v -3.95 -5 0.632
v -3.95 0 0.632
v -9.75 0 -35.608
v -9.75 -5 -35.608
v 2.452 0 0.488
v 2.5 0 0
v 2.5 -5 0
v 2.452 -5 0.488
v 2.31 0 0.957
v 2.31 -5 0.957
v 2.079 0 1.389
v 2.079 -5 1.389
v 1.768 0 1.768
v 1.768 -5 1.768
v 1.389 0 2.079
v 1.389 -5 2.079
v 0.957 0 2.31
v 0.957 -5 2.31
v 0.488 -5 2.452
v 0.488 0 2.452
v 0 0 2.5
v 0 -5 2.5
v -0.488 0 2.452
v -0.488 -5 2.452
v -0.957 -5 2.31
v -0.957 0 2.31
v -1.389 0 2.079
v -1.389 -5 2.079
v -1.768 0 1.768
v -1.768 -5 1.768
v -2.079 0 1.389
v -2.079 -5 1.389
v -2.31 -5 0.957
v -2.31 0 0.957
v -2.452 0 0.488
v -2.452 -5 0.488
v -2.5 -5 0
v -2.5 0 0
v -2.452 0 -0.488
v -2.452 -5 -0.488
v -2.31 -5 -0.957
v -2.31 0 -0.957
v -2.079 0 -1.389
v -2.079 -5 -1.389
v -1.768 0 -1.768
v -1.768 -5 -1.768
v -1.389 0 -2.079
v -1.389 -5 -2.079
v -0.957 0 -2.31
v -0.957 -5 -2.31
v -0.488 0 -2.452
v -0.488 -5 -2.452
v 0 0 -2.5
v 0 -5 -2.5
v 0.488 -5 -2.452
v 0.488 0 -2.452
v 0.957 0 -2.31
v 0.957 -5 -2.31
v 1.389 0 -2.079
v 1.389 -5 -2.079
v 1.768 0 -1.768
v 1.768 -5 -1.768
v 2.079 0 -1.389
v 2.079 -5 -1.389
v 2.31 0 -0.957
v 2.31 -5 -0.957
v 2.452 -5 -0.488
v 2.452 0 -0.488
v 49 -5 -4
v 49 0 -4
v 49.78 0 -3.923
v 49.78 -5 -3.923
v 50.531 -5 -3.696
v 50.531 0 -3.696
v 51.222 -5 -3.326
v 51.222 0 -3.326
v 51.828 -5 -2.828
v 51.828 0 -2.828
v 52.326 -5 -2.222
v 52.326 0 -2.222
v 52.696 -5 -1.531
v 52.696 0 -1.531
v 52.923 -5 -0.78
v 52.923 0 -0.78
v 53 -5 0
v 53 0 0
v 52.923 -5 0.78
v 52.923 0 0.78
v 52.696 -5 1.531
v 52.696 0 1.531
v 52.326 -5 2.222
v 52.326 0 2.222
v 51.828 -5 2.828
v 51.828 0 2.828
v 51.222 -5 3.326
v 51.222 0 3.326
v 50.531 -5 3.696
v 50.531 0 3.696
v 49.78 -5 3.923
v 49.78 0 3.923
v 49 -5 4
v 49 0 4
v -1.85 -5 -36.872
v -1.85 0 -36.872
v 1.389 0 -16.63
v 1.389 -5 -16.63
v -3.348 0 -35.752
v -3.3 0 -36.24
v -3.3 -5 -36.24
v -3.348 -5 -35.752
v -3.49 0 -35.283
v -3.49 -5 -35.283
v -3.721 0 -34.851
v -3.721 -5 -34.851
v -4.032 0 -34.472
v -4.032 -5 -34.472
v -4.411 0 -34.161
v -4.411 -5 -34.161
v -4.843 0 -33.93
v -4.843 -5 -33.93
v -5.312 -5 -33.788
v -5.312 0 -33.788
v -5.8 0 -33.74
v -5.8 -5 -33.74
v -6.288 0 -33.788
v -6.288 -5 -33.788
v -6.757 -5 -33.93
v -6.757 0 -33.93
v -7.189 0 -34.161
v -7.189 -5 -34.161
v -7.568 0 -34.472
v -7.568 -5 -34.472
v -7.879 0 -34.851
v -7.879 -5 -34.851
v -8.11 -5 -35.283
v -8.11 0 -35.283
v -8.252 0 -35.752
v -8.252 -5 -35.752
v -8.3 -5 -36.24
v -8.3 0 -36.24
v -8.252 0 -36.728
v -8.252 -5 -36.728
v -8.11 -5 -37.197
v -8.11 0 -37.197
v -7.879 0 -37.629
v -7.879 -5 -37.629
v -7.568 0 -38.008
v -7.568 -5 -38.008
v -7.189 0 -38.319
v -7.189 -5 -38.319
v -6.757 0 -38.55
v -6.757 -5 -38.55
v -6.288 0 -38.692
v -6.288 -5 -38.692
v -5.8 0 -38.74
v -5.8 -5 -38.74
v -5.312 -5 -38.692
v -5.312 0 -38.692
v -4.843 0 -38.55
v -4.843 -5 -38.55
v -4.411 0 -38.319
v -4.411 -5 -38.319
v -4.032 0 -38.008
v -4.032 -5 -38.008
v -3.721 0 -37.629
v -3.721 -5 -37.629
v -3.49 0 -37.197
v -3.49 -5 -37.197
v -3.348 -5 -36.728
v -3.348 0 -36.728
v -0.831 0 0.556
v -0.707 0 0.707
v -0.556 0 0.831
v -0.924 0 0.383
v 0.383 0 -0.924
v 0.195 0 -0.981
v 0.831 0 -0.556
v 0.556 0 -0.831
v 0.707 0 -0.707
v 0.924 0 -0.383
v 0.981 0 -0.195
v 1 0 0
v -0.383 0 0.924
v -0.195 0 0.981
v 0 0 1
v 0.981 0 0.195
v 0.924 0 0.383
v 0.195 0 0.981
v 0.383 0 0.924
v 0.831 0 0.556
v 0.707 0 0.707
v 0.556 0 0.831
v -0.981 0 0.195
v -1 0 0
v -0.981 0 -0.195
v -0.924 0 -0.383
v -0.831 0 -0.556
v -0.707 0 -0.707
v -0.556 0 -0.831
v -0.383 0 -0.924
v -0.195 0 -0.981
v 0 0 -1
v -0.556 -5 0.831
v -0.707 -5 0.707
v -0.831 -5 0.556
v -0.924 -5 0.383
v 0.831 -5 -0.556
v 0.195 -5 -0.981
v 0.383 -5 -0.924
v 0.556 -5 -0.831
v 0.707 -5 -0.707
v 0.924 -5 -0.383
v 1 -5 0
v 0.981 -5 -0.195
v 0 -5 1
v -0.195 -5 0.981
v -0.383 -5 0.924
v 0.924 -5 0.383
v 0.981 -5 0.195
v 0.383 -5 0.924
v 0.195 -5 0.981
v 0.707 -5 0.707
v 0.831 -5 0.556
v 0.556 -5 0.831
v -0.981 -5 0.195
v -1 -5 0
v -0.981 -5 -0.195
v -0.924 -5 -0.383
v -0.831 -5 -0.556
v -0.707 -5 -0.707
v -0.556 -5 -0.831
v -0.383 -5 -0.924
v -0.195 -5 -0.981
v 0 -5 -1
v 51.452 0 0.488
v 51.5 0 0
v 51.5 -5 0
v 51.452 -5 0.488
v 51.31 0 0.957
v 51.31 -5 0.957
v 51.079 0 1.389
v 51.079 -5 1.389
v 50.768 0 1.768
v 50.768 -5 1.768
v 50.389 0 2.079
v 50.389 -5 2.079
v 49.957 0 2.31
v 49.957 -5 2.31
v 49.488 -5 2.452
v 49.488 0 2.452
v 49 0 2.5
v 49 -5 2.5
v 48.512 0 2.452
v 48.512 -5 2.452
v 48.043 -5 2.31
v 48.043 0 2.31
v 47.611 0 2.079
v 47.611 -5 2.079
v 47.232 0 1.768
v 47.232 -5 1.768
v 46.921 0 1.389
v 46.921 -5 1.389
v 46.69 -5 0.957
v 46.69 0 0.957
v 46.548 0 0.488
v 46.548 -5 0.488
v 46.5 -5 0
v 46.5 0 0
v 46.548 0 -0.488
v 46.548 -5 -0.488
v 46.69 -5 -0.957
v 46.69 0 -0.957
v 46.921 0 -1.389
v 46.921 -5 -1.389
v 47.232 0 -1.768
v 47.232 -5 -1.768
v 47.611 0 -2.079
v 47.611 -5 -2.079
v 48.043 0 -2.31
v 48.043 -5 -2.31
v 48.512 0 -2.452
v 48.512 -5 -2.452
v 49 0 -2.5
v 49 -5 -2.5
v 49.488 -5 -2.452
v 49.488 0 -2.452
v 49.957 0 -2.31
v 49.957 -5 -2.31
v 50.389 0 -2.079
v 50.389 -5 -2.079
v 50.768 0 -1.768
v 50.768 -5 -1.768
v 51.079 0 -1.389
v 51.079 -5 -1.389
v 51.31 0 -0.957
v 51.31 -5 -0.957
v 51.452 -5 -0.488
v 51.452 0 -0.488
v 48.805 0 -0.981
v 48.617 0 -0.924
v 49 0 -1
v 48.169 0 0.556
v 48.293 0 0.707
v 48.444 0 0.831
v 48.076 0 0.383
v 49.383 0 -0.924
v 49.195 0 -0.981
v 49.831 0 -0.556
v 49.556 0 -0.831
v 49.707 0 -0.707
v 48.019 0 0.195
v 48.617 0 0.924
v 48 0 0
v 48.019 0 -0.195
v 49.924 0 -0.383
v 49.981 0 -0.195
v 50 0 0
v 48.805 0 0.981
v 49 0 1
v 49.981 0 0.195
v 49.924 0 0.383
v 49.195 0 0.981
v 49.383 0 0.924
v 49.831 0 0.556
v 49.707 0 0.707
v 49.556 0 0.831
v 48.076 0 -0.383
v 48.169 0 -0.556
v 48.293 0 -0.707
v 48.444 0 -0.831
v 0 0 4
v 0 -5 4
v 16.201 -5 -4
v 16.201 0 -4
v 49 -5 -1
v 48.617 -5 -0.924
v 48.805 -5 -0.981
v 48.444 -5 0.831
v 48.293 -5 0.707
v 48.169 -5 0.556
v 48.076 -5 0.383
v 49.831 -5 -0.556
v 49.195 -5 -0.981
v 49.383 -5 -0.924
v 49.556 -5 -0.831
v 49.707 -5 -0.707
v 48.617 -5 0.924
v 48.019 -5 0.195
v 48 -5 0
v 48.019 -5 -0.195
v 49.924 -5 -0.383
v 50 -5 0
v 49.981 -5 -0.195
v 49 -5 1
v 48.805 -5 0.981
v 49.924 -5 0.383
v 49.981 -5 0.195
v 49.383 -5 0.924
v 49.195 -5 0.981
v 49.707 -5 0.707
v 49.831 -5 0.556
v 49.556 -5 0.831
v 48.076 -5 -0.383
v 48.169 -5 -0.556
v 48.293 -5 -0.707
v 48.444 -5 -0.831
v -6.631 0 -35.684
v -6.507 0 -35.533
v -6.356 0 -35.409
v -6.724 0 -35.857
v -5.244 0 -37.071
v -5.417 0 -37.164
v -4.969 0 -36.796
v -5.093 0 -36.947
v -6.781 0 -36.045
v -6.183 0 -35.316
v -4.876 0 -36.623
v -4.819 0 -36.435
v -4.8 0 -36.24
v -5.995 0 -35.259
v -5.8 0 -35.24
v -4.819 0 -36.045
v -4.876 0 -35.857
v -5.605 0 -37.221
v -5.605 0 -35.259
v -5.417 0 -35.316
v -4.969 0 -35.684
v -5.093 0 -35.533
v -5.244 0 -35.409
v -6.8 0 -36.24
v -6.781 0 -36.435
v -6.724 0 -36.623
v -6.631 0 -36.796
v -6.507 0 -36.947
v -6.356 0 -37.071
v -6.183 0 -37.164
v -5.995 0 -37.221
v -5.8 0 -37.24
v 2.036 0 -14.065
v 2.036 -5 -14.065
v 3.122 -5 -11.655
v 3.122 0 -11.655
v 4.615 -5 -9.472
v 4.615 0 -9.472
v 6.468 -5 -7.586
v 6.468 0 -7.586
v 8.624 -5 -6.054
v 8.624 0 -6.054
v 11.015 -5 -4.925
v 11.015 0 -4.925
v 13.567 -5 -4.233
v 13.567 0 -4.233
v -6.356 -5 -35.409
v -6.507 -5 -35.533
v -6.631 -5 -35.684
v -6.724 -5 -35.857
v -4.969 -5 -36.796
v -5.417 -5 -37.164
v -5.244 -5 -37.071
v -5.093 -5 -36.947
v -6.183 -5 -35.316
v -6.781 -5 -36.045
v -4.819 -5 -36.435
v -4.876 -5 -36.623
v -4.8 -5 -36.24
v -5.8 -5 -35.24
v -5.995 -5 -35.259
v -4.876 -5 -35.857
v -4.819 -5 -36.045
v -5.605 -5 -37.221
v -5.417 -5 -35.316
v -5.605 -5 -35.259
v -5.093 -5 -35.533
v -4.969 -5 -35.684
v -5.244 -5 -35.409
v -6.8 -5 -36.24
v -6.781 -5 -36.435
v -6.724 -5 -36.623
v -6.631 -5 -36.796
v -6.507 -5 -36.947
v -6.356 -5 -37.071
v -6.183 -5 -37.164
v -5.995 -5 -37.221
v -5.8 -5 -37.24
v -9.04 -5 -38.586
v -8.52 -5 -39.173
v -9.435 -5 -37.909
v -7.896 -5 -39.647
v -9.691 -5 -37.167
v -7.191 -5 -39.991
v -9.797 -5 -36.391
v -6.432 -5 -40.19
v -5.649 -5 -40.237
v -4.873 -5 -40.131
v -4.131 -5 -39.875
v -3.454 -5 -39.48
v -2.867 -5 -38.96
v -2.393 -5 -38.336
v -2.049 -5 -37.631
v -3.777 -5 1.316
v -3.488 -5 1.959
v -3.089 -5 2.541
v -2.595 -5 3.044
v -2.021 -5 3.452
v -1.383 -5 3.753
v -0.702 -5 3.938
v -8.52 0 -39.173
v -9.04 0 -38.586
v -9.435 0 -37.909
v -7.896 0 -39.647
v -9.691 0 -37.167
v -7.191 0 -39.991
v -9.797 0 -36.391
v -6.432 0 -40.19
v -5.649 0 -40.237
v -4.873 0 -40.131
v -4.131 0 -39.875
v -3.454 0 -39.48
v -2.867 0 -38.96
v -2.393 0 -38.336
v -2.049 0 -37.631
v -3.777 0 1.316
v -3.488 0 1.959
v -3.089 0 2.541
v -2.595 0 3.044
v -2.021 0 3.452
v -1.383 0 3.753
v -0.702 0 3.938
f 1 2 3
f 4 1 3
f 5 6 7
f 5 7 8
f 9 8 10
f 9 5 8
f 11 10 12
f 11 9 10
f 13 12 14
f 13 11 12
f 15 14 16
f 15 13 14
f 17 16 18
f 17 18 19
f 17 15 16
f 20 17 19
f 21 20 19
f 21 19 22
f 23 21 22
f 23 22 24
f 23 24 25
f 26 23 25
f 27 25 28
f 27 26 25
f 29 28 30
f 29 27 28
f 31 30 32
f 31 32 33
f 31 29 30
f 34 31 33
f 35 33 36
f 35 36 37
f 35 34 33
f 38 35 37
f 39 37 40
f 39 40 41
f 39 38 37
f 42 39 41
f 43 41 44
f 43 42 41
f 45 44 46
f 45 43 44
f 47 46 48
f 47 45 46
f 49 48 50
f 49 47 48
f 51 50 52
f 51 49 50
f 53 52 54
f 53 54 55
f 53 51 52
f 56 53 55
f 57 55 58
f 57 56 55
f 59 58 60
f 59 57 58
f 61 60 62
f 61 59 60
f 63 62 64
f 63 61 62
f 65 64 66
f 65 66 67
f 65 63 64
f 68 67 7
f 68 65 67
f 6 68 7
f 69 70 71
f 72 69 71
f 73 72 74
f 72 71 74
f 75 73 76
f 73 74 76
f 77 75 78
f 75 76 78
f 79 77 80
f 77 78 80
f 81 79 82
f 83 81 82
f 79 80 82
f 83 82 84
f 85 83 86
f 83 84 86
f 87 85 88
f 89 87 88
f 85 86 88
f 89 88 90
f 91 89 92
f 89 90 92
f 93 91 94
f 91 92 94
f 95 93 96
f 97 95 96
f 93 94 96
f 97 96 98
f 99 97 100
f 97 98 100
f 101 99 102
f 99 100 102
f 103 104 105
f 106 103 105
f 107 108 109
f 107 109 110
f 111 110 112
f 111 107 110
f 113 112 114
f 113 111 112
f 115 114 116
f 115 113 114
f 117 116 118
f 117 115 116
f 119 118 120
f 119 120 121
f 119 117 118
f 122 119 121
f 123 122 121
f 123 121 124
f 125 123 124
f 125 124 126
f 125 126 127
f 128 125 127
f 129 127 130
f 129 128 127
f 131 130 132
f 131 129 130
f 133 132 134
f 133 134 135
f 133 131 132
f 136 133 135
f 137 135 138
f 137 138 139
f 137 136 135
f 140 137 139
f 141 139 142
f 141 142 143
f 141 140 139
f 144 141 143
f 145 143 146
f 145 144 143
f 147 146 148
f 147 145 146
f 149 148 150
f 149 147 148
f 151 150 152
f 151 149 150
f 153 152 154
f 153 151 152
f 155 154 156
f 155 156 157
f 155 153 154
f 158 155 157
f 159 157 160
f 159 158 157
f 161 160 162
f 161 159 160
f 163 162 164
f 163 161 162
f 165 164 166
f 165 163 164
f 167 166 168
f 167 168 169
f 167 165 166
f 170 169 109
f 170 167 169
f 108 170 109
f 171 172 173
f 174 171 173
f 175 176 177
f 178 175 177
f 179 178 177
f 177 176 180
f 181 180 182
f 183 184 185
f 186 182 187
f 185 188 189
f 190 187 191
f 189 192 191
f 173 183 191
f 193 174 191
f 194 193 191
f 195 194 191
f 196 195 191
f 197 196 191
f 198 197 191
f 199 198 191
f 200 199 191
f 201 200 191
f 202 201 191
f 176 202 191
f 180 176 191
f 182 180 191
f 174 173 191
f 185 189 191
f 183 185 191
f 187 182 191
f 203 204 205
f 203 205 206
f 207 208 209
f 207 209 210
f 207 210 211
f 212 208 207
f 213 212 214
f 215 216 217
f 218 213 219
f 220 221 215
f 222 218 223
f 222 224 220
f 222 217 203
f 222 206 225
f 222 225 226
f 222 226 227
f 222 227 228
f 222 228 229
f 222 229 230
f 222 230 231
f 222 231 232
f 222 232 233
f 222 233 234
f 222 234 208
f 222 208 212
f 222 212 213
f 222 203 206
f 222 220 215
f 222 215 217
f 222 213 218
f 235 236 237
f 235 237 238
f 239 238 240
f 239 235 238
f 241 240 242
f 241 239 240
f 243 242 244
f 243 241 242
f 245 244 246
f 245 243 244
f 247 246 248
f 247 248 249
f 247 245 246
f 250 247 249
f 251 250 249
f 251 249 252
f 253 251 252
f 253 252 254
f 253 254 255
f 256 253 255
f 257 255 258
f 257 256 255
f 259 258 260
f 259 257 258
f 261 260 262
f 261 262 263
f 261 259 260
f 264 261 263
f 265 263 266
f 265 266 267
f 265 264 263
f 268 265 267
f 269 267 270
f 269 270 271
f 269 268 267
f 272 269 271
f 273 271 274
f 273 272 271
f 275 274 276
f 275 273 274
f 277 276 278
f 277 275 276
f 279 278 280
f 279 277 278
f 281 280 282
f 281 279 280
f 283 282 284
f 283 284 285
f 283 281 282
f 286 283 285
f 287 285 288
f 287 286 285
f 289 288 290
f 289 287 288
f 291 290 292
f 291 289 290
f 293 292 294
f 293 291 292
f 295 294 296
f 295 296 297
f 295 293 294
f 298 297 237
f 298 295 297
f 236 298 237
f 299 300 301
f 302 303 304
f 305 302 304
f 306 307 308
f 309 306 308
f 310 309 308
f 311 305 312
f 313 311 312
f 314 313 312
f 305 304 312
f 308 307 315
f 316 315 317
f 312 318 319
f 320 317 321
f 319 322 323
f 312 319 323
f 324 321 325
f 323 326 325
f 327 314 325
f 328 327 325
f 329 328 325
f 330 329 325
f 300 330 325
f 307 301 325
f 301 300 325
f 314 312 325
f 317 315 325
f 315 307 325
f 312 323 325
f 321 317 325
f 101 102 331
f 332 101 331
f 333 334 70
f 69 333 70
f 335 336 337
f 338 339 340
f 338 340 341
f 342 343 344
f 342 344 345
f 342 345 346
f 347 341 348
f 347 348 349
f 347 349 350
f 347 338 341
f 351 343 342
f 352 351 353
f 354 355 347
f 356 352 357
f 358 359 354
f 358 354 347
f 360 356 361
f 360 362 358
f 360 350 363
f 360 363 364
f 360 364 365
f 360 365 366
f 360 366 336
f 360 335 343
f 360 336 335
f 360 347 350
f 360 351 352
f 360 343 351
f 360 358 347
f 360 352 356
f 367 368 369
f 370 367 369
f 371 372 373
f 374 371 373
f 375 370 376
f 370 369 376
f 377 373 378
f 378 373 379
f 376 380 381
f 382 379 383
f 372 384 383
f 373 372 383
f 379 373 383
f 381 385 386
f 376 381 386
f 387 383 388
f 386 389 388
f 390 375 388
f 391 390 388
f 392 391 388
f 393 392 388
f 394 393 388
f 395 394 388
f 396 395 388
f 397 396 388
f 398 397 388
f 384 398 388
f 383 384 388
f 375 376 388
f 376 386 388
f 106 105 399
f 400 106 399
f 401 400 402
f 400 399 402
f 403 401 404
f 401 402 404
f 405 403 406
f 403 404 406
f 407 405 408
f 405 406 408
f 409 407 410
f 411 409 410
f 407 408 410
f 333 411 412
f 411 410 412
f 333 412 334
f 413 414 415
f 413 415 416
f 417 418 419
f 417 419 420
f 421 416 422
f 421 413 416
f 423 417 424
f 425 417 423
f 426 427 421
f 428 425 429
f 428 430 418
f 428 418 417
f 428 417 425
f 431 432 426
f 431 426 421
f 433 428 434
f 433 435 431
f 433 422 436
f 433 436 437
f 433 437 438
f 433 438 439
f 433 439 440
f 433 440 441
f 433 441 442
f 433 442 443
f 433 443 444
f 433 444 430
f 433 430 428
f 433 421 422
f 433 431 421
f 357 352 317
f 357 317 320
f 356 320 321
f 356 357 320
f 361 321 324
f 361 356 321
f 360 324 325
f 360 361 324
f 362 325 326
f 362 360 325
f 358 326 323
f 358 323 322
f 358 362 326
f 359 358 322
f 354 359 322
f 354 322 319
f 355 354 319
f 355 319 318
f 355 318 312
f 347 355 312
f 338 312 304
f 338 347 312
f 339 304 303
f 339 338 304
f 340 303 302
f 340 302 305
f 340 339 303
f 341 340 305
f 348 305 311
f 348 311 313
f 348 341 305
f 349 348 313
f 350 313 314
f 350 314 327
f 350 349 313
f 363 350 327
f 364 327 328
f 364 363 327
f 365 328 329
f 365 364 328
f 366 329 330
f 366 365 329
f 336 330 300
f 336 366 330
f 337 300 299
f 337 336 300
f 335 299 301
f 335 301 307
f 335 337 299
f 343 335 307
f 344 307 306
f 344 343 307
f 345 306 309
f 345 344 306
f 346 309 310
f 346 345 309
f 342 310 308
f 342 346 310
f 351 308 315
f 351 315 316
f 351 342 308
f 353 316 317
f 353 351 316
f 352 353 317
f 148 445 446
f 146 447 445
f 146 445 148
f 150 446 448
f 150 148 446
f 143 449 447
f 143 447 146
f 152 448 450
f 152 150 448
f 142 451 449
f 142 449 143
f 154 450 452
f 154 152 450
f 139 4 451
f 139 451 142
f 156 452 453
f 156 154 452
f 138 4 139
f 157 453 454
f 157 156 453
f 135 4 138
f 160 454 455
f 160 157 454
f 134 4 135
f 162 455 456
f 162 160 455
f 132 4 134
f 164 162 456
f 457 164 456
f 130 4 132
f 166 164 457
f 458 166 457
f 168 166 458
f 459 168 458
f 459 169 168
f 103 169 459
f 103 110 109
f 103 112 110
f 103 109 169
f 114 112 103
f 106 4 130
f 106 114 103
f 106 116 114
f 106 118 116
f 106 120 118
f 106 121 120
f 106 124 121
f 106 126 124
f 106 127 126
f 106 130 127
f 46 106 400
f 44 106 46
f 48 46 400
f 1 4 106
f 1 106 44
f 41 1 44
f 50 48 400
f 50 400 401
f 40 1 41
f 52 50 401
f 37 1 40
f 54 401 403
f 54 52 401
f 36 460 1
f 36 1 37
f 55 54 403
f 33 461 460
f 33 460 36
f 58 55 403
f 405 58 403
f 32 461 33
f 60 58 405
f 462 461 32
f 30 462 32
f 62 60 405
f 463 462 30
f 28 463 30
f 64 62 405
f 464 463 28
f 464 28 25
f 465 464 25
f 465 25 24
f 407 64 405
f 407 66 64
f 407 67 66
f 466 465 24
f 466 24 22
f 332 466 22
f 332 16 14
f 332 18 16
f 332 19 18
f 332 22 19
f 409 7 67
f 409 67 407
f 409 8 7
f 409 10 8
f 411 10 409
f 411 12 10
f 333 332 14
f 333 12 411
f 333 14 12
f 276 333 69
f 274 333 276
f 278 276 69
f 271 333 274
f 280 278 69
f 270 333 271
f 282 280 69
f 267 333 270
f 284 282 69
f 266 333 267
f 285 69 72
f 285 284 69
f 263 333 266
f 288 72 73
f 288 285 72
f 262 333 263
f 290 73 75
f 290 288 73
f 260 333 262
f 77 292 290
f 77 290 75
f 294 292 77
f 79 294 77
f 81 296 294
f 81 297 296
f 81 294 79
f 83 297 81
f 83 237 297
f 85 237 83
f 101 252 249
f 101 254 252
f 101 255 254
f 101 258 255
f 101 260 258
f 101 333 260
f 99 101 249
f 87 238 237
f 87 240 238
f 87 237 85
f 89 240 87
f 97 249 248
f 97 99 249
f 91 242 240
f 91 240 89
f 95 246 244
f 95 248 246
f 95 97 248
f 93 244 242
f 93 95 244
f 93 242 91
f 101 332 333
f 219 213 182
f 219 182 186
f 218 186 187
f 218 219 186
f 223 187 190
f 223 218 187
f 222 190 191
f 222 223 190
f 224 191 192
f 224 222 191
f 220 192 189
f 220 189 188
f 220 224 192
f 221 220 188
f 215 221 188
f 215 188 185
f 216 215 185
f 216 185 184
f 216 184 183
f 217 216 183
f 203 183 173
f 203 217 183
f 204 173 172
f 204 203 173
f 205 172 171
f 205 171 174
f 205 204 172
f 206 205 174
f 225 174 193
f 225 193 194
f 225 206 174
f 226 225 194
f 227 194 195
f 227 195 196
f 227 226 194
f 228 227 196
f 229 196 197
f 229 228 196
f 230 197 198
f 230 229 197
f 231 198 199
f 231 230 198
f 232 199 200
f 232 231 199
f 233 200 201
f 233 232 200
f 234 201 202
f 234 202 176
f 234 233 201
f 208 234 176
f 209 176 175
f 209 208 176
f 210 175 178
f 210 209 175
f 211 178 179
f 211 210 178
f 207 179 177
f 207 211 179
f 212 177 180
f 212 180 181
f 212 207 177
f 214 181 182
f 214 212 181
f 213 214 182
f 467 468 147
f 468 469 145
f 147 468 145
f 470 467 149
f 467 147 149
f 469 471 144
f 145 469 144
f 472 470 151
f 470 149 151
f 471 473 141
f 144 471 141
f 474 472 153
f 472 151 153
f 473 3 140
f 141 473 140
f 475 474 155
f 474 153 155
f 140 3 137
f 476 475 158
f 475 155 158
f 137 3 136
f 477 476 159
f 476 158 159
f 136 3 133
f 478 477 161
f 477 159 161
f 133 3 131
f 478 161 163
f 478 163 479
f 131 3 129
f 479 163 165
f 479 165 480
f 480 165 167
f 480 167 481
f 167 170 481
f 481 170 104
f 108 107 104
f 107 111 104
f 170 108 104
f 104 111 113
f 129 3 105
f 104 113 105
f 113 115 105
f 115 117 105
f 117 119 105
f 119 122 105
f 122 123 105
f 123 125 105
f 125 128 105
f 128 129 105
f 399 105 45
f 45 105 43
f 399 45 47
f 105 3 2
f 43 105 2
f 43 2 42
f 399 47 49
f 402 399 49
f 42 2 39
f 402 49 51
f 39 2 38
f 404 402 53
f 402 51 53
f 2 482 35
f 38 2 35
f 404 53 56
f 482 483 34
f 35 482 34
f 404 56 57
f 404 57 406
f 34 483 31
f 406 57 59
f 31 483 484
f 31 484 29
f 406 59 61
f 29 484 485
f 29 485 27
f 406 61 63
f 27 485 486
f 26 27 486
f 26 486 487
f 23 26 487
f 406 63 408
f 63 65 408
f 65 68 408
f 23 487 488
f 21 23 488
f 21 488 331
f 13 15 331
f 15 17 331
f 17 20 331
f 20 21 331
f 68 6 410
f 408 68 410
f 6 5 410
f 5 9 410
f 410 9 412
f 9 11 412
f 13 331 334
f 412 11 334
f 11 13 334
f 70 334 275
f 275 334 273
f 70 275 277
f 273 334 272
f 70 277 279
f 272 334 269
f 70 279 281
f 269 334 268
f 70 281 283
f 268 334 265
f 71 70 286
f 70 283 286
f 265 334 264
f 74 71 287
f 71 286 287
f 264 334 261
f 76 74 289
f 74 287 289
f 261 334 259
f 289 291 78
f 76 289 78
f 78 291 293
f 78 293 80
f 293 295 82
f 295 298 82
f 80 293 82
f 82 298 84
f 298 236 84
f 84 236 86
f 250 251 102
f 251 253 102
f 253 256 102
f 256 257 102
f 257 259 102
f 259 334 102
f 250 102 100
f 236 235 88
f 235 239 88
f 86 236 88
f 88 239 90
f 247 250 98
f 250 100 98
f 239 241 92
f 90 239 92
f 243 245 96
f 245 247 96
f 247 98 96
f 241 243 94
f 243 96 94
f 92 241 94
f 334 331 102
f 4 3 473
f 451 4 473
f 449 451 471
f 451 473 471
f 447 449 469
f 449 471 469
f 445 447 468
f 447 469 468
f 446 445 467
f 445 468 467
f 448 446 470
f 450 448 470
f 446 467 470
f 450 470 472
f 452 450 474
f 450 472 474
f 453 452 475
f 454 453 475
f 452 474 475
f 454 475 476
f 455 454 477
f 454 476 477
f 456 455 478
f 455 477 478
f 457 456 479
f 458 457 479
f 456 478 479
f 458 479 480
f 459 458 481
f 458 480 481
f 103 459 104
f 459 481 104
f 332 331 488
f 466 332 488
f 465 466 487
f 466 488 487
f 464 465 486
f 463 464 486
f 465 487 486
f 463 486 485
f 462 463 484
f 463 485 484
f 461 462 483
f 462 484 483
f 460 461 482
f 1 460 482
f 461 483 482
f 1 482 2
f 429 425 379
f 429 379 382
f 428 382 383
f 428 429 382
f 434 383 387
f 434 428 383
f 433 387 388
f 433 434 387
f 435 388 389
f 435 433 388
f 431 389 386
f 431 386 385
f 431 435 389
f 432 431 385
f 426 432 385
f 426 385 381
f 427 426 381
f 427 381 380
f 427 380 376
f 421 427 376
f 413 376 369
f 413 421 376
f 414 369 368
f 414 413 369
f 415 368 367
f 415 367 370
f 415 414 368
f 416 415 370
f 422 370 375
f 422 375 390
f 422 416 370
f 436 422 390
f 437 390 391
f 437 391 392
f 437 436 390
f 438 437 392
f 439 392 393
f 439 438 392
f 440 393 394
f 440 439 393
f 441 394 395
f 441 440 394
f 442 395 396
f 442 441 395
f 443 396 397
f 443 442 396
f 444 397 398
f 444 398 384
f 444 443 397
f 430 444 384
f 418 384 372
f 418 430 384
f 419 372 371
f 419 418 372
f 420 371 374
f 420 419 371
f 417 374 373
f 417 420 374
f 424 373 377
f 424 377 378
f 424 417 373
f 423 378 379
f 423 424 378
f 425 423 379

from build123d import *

# Parameters (mm, degrees)
F0_R     = 2.5
F1_DEPTH = 5
F2_R     = 1
F3_DEPTH = 5


with BuildPart() as f1:
    # F0 (on Front) → F1 (new body)
    with BuildSketch(Plane.XZ):
        with BuildLine():
            Line((49, 4), (0, 4))
            ThreePointArc((0, 4), (-2.59533, 3.043725), (-3.949735, 0.632132))
            Line((-3.949735, 0.632132), (-9.749735, -35.607868))
            ThreePointArc((-9.749735, -35.607868), (-6.432132, -40.189735), (-1.850265, -36.872132))
            Line((-1.850265, -36.872132), (1.389449, -16.629505))
            ThreePointArc((1.389449, -16.629505), (6.468471, -7.58603), (16.200957, -4))
            Line((16.200957, -4), (49, -4))
            ThreePointArc((49, -4), (53, 0), (49, 4))
        make_face()
        with Locations((-5.8, -36.24)):
            Circle(F0_R, mode=Mode.SUBTRACT)
        Circle(F0_R, mode=Mode.SUBTRACT)
        with Locations((49, 0)):
            Circle(F0_R, mode=Mode.SUBTRACT)
    extrude(amount=F1_DEPTH)


with BuildPart() as f3:
    # F2 (on face) → F3 (new body)
    with BuildSketch(Plane.XZ.offset(5)):
        with Locations((-5.8, -36.24)):
            Circle(F2_R)
        Circle(F2_R)
        with Locations((49, 0)):
            Circle(F2_R)
    extrude(amount=-F3_DEPTH)


solid = Compound([f1.part, f3.part])
